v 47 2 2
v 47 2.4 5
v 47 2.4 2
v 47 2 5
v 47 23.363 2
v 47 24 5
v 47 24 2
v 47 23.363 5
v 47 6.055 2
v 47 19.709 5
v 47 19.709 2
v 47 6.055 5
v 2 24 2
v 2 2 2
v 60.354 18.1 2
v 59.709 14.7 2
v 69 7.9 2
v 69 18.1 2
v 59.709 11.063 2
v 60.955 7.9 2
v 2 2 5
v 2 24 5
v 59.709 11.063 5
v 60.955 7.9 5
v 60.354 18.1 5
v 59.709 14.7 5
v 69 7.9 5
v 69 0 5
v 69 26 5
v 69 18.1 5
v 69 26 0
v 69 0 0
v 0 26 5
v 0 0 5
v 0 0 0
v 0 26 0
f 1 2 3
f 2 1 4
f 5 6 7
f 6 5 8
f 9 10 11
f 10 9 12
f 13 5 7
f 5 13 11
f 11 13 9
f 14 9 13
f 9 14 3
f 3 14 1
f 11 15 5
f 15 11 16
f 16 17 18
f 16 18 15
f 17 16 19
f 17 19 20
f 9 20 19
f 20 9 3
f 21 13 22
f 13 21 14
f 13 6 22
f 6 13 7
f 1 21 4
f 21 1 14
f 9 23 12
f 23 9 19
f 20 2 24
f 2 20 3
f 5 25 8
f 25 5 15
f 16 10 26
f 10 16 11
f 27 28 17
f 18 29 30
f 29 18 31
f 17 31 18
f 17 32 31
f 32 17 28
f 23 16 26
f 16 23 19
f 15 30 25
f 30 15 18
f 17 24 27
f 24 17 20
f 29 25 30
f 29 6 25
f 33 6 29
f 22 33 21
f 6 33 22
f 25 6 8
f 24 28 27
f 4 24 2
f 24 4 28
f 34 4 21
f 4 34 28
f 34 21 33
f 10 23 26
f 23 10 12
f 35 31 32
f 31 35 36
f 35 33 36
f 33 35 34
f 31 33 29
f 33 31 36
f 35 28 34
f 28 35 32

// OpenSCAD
// Buck converter housing for TTU lightning's WT-SANTA instrument
// Created 5 Februrary 2026 by Sam Gardner <samuel.gardner@ttu.edu>

// Parameters (all dimensions in mm)
buck_length = 45;
buck_depth = 10;
lid_depth = 5;
buck_width = 22;
casing_thickness = 2;

cable_cavity_length = 20;
cable_inset_width = 0.4;
wire_length_internal = 15;
wire_diameter = 3.4;



// Bottom half
difference() {
    // Outer shell
    cube([buck_length + cable_cavity_length + 2*casing_thickness, buck_width + 2*casing_thickness, (buck_depth-lid_depth)]);
    
    union() {
        // Inner cavity
        translate([casing_thickness, casing_thickness, casing_thickness]) {
            cube([buck_length, buck_width, buck_depth*2]);
            output_width = 3*wire_diameter;
            south_output_inset = (buck_width/2 - output_width/2);
            channel_rotation_angle = asin((south_output_inset - cable_inset_width)/wire_length_internal);
            extra_length = wire_diameter*sin(channel_rotation_angle);
            output_length = (cable_cavity_length - wire_length_internal*cos(channel_rotation_angle) + casing_thickness + extra_length);
            // Cable cavity (south)
            translate([buck_length, cable_inset_width, 0]) {
                rotate([0, 0, channel_rotation_angle]) cube([wire_length_internal, wire_diameter, buck_depth*2]);
                
            }
            // Cable cavity (north)
            translate([buck_length, buck_width - cable_inset_width - wire_diameter, 0]) {
                translate([-extra_length, 0, 0]) rotate([0, 0, -channel_rotation_angle]) cube([wire_length_internal, wire_diameter, buck_depth*2]);
            }
            // // Cable cavity (connecting channel)
            // translate([buck_length + wire_length_internal - wire_diameter, cable_inset_width + wire_diameter, 0]) {
            //     cube([wire_diameter, buck_width - 2*cable_inset_width - 2*wire_diameter, buck_depth*2]);
            // }
            // Cable cavity (output hole)
            translate([(buck_length + cable_cavity_length + casing_thickness) - output_length, buck_width/2 - output_width/2, 0]) {
                cube([output_length, output_width, buck_depth*2]);
            }
        }
    }
}
